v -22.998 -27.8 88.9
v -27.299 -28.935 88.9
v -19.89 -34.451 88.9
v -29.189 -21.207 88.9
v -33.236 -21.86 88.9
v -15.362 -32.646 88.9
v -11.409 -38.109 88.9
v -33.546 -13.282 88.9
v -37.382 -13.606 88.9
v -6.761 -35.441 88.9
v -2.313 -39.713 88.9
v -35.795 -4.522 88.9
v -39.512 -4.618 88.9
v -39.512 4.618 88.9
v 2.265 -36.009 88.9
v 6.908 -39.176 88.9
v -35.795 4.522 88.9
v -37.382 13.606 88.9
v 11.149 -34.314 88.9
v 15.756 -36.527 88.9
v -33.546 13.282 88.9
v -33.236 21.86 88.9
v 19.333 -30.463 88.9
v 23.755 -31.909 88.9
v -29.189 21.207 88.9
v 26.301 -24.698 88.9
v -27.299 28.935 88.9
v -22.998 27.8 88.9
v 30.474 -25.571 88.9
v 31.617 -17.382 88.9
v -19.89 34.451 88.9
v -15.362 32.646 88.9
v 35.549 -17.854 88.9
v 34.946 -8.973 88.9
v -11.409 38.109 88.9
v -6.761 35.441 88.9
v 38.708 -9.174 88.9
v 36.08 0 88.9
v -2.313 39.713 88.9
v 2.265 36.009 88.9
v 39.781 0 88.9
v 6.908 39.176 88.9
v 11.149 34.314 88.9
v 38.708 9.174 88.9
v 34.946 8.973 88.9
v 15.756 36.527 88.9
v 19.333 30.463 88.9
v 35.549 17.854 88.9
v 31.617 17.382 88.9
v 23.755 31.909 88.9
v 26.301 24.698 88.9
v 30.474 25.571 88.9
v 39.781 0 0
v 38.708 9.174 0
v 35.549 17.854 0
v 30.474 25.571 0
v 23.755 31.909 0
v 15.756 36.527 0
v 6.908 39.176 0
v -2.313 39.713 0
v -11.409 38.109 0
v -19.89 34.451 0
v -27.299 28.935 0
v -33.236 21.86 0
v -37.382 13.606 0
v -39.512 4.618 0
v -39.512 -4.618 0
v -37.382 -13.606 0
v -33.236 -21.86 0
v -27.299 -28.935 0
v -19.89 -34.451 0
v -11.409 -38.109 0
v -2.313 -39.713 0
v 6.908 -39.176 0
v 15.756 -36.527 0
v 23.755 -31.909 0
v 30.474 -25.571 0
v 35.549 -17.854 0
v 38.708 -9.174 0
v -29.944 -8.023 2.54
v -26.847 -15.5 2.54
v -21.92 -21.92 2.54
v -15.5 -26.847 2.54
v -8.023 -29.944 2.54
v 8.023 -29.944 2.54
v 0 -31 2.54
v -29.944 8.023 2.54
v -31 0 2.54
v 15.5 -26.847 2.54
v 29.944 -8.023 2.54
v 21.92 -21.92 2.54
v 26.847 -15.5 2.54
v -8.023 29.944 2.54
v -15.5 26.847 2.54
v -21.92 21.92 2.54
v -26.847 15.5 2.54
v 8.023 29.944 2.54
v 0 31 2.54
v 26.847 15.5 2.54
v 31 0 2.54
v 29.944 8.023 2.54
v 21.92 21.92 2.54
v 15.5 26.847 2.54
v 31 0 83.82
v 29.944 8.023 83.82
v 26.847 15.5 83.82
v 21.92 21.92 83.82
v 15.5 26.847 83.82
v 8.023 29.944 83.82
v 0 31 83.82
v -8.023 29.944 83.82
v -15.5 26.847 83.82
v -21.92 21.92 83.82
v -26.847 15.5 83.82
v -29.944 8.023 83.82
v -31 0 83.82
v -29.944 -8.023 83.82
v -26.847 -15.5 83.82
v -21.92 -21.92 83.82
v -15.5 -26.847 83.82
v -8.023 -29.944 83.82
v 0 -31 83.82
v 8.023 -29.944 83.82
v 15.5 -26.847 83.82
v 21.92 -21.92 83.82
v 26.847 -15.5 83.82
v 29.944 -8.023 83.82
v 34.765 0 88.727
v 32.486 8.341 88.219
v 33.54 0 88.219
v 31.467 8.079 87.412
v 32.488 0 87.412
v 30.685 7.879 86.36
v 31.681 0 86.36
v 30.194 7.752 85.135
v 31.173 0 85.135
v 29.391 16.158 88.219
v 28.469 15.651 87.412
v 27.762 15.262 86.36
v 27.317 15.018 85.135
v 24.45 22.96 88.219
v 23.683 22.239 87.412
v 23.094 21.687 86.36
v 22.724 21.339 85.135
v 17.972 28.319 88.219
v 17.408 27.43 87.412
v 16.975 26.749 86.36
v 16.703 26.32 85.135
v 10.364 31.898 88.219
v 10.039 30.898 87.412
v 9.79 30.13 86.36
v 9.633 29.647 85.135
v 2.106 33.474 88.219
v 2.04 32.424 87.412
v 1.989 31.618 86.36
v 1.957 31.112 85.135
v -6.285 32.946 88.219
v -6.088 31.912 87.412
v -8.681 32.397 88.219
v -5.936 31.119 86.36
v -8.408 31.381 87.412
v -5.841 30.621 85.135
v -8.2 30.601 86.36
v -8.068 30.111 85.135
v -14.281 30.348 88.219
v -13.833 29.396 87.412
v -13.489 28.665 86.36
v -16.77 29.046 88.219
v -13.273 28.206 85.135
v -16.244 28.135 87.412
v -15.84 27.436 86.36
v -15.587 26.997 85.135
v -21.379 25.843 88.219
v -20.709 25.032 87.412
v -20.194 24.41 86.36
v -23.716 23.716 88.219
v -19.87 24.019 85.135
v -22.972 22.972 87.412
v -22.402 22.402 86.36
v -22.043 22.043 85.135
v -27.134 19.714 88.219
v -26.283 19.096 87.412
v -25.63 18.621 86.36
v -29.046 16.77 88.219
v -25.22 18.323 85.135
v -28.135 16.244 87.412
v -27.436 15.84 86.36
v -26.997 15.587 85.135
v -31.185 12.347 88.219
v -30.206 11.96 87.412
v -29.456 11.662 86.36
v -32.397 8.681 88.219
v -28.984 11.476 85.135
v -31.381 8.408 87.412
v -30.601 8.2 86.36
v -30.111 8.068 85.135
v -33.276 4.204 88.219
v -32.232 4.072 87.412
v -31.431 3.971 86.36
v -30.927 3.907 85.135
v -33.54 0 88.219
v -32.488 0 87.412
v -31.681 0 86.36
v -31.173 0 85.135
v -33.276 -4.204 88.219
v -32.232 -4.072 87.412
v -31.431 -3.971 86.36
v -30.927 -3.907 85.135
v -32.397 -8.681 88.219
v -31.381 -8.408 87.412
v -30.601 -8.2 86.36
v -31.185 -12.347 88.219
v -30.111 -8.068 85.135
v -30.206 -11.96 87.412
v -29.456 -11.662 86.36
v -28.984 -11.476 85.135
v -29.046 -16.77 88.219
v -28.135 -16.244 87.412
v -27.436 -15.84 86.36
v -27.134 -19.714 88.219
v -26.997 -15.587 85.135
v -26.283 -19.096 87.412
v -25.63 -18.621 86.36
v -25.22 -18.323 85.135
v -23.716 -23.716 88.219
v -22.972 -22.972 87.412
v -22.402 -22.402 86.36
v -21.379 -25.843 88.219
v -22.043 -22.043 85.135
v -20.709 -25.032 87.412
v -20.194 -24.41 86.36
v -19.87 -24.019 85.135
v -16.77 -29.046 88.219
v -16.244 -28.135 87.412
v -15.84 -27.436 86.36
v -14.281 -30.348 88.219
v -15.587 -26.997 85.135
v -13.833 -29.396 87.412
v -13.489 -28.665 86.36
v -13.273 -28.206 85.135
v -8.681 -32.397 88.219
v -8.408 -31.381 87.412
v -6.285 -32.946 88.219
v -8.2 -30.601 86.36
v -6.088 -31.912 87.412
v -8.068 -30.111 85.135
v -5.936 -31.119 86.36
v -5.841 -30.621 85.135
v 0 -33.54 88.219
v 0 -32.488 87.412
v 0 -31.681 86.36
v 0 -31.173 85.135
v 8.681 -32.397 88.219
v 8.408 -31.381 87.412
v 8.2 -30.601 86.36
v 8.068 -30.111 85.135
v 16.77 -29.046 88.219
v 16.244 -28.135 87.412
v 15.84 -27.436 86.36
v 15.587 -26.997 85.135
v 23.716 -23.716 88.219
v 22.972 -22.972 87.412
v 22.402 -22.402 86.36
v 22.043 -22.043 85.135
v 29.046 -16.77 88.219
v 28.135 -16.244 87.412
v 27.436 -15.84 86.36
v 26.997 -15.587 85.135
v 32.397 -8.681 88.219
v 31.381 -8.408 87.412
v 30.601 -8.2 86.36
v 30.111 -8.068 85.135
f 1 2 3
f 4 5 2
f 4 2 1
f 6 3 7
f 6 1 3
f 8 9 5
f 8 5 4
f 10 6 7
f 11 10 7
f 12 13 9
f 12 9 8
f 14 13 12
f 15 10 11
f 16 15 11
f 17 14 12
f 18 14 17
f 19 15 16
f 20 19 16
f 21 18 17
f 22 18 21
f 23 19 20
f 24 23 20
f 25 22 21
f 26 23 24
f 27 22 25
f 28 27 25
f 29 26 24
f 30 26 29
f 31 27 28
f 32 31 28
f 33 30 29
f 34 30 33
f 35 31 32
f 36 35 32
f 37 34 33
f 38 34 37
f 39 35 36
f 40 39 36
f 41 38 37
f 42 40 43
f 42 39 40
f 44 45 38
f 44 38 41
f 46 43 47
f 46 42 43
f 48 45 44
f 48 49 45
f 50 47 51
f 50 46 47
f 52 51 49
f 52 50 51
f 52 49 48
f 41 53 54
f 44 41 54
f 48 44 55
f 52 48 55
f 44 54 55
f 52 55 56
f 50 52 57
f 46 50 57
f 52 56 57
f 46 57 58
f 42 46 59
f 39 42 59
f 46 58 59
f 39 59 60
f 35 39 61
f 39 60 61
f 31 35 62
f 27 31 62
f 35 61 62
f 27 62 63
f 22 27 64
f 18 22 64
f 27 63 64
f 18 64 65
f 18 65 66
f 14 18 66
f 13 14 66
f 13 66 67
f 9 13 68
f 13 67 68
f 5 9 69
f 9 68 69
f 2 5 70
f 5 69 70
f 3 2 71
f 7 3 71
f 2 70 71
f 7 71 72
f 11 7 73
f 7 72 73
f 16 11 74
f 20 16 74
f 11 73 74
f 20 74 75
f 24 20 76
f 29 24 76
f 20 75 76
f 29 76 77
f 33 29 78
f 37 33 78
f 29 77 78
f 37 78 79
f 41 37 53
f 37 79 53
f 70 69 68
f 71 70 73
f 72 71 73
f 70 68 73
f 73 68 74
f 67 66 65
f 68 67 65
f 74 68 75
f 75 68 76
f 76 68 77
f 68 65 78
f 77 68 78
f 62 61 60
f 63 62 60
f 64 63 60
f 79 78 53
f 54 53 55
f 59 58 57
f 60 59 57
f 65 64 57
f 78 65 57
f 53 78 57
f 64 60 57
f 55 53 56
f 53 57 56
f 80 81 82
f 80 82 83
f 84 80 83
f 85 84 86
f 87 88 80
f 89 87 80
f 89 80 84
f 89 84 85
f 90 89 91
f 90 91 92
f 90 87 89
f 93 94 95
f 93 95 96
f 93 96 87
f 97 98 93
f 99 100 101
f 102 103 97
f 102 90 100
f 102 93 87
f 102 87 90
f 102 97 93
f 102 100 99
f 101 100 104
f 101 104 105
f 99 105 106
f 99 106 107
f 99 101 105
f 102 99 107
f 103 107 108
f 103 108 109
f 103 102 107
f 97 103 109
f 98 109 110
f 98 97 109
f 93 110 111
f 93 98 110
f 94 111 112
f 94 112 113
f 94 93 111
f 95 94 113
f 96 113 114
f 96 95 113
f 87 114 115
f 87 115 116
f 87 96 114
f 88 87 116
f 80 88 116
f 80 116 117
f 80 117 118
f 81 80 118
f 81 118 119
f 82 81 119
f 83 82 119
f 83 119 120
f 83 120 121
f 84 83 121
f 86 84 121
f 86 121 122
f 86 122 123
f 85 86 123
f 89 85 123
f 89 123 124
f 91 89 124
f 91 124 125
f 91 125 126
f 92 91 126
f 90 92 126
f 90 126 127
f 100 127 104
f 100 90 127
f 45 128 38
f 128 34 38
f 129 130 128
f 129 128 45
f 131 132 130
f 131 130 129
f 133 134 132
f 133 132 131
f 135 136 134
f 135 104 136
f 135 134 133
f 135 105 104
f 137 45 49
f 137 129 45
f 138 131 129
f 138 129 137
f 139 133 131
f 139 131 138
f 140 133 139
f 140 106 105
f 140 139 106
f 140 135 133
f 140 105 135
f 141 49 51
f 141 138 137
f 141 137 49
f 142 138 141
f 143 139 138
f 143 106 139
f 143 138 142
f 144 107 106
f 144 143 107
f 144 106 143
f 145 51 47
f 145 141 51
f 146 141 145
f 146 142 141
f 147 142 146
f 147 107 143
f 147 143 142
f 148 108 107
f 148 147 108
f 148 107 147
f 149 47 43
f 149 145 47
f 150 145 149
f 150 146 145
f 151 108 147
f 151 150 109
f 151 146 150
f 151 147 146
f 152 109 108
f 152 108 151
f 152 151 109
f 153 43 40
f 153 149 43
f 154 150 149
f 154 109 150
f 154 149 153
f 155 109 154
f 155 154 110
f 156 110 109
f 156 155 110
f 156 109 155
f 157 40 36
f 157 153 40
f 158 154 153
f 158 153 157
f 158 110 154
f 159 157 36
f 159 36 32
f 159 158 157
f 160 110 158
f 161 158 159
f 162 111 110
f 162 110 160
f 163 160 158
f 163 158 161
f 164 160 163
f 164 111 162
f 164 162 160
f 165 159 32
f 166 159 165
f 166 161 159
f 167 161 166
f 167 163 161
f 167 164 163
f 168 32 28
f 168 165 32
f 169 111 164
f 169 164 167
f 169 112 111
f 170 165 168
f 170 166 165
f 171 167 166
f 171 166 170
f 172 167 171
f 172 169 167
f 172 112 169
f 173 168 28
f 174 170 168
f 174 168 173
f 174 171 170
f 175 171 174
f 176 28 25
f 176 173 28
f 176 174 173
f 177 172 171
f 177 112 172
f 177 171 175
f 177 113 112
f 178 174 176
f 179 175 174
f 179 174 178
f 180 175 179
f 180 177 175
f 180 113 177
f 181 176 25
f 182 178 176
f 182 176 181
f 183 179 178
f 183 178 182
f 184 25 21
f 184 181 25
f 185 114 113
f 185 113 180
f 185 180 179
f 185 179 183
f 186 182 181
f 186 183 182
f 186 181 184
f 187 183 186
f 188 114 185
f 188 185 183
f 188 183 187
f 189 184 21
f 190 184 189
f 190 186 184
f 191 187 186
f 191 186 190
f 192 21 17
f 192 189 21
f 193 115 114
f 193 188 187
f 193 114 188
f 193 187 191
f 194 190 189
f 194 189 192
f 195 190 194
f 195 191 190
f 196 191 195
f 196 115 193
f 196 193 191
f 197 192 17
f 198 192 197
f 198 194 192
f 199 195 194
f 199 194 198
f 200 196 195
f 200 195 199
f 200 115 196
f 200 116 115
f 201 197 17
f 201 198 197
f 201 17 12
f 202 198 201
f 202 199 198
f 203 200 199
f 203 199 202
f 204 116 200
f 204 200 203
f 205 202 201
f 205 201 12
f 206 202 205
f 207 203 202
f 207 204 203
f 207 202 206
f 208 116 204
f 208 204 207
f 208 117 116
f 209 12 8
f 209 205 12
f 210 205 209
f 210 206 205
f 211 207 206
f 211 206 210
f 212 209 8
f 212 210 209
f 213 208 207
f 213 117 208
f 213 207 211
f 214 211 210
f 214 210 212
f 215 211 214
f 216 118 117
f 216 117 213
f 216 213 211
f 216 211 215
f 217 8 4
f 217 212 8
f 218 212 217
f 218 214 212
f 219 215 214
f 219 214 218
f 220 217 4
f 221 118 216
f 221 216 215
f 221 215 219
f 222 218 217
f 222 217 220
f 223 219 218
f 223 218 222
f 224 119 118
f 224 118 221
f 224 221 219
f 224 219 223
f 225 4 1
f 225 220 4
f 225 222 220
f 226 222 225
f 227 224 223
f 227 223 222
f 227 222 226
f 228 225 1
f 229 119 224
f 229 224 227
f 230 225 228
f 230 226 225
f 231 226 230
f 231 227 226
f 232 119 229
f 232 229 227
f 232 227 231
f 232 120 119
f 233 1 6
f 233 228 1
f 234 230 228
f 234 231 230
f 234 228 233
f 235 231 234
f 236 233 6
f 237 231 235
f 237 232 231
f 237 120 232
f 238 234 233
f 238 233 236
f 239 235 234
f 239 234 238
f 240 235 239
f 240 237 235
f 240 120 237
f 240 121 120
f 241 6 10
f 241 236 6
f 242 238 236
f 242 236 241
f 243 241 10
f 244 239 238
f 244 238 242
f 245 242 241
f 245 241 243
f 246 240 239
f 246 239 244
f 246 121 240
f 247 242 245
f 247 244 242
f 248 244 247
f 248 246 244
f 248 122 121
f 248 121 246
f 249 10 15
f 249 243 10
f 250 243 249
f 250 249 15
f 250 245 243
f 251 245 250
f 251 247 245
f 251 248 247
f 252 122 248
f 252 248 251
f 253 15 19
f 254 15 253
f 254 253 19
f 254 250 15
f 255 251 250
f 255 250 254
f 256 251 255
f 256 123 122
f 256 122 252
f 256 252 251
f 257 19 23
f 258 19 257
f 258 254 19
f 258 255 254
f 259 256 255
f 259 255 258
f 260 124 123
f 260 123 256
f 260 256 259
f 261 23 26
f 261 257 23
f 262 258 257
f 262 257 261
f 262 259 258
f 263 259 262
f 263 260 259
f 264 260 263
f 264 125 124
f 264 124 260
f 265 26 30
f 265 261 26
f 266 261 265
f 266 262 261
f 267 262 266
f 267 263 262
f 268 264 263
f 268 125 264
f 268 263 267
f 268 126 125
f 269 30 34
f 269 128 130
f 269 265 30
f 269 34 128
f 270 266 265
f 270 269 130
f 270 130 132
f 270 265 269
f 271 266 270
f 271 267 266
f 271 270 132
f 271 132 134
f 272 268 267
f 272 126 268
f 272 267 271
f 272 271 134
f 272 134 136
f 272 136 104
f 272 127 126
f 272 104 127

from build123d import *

# Parameters (mm, degrees)
F0_R     = 39.780695
F0_R_2   = 31
F1_DEPTH = 88.9
F2_DEPTH = 2.54
F3_R     = 5.08


with BuildPart() as f1:
    # F0 (on Top) → F1 (new body)
    with BuildSketch(Plane.XY):
        Circle(F0_R)
        Circle(F0_R_2, mode=Mode.SUBTRACT)
    extrude(amount=F1_DEPTH)

    # F0 (on Top) → F2 (join)
    with BuildSketch(Plane.XY):
        Circle(F0_R_2)
    extrude(amount=F2_DEPTH)

    # F3
    f3_edges = [f1.edges().sort_by_distance(p)[0] for p in [
        (-31, 0, 88.9),
    ]]
    fillet(f3_edges, radius=F3_R)


solid = f1.part
